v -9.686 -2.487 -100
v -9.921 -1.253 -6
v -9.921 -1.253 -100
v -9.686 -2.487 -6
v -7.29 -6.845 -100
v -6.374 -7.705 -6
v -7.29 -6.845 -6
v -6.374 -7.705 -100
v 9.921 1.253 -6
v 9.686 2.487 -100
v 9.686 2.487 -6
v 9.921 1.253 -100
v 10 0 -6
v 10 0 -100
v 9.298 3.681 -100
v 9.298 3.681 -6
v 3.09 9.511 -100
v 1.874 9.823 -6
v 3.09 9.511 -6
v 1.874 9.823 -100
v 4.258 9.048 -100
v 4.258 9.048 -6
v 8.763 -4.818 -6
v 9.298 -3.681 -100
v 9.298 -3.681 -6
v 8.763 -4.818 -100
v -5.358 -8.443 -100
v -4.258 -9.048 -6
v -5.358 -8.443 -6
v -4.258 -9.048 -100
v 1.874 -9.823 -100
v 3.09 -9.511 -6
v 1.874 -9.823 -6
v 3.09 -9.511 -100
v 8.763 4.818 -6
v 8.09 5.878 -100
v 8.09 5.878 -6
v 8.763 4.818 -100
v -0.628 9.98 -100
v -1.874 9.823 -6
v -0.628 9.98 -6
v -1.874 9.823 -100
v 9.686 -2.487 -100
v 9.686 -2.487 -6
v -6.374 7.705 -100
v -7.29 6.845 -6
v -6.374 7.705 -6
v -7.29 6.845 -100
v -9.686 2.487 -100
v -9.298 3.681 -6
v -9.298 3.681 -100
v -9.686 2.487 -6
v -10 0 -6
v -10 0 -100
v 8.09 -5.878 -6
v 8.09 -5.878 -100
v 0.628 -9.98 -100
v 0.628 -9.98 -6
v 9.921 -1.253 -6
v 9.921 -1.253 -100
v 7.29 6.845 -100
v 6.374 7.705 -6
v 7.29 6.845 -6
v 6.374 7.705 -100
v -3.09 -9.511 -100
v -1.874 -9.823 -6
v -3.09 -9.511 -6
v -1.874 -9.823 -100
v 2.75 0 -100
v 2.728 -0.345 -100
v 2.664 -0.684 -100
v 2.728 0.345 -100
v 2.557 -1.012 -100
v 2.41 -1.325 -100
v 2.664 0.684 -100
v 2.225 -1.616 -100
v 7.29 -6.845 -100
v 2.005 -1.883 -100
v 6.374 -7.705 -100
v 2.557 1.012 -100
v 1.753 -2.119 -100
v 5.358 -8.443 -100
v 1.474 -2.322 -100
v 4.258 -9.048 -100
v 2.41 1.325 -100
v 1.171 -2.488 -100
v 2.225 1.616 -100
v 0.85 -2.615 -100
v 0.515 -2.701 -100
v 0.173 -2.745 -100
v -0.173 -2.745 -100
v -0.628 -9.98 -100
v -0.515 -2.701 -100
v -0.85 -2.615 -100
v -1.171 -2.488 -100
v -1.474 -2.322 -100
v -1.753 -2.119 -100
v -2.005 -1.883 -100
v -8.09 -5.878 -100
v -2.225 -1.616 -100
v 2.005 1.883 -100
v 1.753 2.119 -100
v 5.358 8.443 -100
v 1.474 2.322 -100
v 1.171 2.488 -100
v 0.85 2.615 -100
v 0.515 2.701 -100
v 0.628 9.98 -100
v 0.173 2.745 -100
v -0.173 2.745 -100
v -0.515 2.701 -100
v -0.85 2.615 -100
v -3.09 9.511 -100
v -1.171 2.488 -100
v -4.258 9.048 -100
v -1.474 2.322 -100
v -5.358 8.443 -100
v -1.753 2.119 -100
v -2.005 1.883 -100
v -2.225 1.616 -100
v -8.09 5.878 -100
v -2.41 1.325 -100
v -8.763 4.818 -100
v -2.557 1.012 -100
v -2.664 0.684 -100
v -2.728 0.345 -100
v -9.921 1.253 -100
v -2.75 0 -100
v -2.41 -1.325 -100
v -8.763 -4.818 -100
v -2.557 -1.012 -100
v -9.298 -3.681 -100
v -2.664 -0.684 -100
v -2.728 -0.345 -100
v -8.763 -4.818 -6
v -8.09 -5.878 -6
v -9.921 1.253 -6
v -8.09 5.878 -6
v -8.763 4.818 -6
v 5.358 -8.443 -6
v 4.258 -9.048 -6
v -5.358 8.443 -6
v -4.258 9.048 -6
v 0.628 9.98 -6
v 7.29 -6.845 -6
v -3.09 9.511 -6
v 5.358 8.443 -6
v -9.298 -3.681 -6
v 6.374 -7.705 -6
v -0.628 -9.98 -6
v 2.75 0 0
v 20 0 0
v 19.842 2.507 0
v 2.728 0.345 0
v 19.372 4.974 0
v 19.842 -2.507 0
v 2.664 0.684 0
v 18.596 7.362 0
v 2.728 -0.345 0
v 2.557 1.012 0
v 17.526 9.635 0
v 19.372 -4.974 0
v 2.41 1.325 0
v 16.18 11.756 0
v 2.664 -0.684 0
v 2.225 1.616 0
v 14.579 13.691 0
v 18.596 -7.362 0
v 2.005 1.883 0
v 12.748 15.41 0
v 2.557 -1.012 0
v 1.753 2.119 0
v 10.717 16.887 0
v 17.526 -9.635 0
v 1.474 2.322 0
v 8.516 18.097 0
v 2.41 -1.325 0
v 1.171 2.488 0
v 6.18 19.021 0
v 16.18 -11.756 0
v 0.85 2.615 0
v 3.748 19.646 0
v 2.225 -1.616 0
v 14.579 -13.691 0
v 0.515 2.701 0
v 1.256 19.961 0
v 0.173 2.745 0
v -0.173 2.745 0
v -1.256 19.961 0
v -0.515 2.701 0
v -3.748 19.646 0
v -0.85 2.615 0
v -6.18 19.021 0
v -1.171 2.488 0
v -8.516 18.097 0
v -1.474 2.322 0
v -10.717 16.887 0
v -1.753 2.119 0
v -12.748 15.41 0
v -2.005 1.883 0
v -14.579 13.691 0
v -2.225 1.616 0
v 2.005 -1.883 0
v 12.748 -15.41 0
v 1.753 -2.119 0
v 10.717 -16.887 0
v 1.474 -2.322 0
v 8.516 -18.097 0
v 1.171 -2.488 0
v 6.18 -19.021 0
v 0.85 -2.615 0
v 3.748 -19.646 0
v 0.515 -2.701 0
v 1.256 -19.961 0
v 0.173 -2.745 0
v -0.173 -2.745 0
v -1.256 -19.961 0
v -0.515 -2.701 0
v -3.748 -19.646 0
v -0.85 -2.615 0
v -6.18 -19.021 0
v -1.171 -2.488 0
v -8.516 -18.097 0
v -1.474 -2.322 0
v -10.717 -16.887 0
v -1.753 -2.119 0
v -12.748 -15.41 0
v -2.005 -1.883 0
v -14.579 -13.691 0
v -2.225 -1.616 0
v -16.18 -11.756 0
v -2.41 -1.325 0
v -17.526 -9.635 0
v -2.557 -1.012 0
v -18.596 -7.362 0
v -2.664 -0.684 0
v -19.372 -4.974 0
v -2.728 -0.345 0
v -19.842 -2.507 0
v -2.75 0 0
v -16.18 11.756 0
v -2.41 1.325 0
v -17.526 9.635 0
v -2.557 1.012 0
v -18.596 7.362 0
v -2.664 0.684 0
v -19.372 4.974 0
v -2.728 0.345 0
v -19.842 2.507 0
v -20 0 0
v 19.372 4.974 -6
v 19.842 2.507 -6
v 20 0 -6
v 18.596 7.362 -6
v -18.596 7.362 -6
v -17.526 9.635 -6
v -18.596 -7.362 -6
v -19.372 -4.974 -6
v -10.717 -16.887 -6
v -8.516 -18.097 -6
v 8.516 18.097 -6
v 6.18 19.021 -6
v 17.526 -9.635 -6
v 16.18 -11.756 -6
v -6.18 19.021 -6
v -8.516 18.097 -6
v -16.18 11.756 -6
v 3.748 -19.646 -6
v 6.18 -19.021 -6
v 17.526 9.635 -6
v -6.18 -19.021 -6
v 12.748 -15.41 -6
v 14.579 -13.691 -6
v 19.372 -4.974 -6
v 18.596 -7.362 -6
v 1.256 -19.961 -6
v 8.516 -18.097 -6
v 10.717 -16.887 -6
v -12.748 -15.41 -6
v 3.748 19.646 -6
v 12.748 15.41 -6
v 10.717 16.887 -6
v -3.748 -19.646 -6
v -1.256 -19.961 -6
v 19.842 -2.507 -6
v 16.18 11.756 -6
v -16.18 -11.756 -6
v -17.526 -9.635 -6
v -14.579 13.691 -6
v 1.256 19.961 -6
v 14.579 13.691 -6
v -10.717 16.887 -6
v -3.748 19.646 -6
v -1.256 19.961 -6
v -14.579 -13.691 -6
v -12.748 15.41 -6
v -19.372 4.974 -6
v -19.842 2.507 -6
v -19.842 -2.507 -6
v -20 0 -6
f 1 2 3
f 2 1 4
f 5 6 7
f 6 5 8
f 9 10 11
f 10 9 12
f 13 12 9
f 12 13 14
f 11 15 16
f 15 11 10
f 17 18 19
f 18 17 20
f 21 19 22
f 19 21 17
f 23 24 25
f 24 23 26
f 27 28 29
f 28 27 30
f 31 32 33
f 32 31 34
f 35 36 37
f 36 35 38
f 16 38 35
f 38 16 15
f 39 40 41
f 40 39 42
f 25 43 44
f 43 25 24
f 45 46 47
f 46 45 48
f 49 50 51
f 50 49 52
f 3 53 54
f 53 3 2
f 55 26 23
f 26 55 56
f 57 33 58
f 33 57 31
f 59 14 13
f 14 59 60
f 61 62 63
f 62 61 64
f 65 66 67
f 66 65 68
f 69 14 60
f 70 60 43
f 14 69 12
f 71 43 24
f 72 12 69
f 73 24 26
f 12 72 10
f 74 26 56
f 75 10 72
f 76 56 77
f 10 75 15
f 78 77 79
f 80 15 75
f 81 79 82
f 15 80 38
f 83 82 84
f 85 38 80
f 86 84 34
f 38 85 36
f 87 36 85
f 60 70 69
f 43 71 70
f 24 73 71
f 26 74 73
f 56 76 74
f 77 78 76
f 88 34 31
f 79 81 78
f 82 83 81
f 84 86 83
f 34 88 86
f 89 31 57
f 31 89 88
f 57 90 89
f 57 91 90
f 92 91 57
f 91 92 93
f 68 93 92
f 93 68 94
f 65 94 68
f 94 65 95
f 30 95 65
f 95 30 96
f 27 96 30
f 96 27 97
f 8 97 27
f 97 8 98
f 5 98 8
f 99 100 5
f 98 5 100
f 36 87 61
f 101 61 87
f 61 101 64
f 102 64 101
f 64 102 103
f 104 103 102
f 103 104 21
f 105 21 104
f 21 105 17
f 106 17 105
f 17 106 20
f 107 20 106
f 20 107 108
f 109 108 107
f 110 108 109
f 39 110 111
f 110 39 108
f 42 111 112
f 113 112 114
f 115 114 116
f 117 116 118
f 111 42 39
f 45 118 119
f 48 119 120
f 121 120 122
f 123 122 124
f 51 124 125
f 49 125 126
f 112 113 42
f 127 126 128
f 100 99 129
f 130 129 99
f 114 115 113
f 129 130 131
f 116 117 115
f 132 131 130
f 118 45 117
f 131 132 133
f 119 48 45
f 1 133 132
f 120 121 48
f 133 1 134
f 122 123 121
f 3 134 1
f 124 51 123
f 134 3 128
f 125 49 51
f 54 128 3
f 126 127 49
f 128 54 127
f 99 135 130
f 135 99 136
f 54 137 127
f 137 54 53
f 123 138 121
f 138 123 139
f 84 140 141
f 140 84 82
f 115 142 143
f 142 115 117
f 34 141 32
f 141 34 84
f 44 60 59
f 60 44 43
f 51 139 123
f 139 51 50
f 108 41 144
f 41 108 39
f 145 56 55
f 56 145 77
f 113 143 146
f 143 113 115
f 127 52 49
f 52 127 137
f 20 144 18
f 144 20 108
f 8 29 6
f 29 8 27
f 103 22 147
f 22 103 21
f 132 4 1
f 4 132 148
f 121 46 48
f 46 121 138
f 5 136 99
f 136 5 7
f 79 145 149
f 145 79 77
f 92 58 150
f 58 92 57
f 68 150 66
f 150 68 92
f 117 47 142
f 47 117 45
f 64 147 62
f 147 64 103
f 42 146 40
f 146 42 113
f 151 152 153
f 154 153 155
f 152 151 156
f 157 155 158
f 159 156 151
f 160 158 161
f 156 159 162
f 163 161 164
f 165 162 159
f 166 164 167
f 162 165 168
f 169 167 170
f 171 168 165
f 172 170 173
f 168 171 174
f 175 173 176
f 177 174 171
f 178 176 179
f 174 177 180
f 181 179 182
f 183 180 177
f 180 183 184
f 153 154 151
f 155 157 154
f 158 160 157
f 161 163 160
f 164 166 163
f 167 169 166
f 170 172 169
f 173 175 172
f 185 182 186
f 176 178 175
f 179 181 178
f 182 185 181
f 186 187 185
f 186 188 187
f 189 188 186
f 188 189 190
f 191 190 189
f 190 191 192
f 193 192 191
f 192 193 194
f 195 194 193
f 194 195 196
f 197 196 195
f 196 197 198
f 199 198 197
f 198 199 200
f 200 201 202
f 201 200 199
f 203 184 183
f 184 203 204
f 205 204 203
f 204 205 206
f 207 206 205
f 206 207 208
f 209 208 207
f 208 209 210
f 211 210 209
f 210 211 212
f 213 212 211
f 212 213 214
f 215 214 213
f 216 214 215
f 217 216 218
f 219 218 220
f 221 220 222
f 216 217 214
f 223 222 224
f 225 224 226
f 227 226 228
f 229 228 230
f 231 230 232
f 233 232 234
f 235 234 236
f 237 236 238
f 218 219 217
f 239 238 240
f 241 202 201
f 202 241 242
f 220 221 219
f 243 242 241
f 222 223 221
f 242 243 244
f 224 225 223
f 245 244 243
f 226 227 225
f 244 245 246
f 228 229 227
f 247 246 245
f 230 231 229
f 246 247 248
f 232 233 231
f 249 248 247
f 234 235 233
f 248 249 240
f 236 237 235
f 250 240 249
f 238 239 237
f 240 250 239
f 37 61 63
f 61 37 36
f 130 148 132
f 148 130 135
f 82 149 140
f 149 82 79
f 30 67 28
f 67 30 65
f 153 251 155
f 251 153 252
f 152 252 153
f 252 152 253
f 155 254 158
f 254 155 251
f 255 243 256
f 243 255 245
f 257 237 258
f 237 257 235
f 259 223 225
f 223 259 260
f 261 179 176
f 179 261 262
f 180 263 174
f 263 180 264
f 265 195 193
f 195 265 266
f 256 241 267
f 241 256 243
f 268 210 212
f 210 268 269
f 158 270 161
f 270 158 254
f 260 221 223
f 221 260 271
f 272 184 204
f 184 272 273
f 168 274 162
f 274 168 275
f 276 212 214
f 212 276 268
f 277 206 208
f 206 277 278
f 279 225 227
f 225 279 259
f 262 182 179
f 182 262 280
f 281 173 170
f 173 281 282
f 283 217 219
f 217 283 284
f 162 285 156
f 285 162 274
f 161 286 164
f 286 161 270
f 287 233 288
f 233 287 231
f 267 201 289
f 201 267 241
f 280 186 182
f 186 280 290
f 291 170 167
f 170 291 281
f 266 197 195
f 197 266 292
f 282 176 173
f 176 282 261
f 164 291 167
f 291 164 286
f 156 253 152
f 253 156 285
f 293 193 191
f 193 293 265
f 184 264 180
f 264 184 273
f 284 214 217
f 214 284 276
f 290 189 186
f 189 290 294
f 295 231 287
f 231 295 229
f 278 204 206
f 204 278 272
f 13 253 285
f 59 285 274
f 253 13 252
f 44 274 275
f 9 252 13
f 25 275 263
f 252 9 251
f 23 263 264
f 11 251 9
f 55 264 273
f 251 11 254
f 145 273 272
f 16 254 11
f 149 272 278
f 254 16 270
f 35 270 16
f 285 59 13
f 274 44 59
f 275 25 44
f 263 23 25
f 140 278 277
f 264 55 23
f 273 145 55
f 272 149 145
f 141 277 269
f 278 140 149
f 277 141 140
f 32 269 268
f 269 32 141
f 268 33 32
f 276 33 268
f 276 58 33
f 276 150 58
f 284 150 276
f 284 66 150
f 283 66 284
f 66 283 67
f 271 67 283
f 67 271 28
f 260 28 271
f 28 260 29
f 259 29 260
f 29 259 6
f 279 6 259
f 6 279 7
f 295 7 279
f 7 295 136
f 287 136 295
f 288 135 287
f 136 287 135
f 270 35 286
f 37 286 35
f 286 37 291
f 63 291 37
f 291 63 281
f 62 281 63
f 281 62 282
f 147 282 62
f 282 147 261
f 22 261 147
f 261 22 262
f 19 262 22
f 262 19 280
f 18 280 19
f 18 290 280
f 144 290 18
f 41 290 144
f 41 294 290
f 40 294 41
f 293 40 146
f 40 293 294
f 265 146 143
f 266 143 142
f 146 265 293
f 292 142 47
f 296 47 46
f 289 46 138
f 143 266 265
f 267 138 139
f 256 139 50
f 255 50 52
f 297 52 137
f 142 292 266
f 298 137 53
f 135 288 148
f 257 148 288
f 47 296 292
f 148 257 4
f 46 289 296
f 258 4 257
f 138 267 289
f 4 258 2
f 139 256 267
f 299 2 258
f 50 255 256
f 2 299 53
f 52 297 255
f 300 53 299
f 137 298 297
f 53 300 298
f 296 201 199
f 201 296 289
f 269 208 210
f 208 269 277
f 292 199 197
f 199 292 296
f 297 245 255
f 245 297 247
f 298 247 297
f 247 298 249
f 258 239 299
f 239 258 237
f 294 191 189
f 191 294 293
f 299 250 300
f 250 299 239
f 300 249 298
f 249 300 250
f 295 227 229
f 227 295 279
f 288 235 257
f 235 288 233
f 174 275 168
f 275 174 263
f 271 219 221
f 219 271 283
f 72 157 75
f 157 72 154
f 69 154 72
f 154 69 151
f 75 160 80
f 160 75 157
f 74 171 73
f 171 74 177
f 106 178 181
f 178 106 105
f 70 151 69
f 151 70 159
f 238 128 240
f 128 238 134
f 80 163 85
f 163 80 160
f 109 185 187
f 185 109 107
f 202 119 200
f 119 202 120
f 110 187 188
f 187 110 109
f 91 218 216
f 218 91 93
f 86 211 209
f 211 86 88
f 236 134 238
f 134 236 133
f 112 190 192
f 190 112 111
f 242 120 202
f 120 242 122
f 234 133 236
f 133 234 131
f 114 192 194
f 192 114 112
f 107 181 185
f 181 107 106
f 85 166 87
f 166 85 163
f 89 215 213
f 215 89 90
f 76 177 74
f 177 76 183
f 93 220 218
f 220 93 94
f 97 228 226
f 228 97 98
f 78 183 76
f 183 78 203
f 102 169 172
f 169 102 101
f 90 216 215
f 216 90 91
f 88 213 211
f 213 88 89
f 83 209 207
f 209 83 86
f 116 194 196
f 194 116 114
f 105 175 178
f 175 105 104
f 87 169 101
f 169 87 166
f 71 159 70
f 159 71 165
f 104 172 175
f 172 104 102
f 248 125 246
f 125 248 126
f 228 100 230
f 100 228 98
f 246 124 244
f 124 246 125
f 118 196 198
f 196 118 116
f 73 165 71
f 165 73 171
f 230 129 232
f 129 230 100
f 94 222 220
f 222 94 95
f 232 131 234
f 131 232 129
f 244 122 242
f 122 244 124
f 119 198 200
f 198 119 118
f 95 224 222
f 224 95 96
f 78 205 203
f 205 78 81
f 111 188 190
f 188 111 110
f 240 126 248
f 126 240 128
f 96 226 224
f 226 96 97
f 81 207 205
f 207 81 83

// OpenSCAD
$fn = 50;


difference() {
	union() {
		translate(v = [0, 0, -100.0000000000]) {
			cylinder(h = 100, r = 10.0000000000);
		}
		translate(v = [0, 0, -6.0000000000]) {
			cylinder(h = 6, r = 20.0000000000);
		}
	}
	union() {
		#translate(v = [0, 0, -100]) {
			cylinder(h = 100, r = 2.7500000000);
		}
	}
}
